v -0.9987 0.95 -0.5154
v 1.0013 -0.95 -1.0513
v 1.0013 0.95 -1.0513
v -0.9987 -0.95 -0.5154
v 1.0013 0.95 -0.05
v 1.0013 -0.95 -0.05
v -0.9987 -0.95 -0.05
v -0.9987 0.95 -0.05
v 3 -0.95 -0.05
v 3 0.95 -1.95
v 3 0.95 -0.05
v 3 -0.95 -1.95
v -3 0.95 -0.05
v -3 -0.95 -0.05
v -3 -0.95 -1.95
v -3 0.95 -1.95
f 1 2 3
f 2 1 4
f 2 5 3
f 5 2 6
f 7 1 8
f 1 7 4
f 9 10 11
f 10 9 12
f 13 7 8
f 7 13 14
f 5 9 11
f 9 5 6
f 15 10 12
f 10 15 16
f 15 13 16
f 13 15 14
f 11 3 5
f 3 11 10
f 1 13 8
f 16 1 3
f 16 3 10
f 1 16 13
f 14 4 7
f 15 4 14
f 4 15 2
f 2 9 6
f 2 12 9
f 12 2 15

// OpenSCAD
//lapa.scad
module vyb()  { 
    rotate ([0, 15, 0]) difference () {
     cube([6, 2, 2], center=true);
     difference  (){
         cube([6, 2, 2], center=true);
         color ("red"){translate ([2, -1.2, 0.5]) rotate([-15, 0, 90]) cube([6, 2, 2]);}
        }
    }
 }
module vyblap() {
      translate([0.0626, 0, -0.0324]) color("cyan") rotate ([0, 180, 0]) translate([-1, 0, 0]) vyb();
}

difference(){
//cube([6, 1.9, 1.9]);
translate([0, 0, -1]) cube([6, 1.9, 1.9], center=true);
vyblap();}
